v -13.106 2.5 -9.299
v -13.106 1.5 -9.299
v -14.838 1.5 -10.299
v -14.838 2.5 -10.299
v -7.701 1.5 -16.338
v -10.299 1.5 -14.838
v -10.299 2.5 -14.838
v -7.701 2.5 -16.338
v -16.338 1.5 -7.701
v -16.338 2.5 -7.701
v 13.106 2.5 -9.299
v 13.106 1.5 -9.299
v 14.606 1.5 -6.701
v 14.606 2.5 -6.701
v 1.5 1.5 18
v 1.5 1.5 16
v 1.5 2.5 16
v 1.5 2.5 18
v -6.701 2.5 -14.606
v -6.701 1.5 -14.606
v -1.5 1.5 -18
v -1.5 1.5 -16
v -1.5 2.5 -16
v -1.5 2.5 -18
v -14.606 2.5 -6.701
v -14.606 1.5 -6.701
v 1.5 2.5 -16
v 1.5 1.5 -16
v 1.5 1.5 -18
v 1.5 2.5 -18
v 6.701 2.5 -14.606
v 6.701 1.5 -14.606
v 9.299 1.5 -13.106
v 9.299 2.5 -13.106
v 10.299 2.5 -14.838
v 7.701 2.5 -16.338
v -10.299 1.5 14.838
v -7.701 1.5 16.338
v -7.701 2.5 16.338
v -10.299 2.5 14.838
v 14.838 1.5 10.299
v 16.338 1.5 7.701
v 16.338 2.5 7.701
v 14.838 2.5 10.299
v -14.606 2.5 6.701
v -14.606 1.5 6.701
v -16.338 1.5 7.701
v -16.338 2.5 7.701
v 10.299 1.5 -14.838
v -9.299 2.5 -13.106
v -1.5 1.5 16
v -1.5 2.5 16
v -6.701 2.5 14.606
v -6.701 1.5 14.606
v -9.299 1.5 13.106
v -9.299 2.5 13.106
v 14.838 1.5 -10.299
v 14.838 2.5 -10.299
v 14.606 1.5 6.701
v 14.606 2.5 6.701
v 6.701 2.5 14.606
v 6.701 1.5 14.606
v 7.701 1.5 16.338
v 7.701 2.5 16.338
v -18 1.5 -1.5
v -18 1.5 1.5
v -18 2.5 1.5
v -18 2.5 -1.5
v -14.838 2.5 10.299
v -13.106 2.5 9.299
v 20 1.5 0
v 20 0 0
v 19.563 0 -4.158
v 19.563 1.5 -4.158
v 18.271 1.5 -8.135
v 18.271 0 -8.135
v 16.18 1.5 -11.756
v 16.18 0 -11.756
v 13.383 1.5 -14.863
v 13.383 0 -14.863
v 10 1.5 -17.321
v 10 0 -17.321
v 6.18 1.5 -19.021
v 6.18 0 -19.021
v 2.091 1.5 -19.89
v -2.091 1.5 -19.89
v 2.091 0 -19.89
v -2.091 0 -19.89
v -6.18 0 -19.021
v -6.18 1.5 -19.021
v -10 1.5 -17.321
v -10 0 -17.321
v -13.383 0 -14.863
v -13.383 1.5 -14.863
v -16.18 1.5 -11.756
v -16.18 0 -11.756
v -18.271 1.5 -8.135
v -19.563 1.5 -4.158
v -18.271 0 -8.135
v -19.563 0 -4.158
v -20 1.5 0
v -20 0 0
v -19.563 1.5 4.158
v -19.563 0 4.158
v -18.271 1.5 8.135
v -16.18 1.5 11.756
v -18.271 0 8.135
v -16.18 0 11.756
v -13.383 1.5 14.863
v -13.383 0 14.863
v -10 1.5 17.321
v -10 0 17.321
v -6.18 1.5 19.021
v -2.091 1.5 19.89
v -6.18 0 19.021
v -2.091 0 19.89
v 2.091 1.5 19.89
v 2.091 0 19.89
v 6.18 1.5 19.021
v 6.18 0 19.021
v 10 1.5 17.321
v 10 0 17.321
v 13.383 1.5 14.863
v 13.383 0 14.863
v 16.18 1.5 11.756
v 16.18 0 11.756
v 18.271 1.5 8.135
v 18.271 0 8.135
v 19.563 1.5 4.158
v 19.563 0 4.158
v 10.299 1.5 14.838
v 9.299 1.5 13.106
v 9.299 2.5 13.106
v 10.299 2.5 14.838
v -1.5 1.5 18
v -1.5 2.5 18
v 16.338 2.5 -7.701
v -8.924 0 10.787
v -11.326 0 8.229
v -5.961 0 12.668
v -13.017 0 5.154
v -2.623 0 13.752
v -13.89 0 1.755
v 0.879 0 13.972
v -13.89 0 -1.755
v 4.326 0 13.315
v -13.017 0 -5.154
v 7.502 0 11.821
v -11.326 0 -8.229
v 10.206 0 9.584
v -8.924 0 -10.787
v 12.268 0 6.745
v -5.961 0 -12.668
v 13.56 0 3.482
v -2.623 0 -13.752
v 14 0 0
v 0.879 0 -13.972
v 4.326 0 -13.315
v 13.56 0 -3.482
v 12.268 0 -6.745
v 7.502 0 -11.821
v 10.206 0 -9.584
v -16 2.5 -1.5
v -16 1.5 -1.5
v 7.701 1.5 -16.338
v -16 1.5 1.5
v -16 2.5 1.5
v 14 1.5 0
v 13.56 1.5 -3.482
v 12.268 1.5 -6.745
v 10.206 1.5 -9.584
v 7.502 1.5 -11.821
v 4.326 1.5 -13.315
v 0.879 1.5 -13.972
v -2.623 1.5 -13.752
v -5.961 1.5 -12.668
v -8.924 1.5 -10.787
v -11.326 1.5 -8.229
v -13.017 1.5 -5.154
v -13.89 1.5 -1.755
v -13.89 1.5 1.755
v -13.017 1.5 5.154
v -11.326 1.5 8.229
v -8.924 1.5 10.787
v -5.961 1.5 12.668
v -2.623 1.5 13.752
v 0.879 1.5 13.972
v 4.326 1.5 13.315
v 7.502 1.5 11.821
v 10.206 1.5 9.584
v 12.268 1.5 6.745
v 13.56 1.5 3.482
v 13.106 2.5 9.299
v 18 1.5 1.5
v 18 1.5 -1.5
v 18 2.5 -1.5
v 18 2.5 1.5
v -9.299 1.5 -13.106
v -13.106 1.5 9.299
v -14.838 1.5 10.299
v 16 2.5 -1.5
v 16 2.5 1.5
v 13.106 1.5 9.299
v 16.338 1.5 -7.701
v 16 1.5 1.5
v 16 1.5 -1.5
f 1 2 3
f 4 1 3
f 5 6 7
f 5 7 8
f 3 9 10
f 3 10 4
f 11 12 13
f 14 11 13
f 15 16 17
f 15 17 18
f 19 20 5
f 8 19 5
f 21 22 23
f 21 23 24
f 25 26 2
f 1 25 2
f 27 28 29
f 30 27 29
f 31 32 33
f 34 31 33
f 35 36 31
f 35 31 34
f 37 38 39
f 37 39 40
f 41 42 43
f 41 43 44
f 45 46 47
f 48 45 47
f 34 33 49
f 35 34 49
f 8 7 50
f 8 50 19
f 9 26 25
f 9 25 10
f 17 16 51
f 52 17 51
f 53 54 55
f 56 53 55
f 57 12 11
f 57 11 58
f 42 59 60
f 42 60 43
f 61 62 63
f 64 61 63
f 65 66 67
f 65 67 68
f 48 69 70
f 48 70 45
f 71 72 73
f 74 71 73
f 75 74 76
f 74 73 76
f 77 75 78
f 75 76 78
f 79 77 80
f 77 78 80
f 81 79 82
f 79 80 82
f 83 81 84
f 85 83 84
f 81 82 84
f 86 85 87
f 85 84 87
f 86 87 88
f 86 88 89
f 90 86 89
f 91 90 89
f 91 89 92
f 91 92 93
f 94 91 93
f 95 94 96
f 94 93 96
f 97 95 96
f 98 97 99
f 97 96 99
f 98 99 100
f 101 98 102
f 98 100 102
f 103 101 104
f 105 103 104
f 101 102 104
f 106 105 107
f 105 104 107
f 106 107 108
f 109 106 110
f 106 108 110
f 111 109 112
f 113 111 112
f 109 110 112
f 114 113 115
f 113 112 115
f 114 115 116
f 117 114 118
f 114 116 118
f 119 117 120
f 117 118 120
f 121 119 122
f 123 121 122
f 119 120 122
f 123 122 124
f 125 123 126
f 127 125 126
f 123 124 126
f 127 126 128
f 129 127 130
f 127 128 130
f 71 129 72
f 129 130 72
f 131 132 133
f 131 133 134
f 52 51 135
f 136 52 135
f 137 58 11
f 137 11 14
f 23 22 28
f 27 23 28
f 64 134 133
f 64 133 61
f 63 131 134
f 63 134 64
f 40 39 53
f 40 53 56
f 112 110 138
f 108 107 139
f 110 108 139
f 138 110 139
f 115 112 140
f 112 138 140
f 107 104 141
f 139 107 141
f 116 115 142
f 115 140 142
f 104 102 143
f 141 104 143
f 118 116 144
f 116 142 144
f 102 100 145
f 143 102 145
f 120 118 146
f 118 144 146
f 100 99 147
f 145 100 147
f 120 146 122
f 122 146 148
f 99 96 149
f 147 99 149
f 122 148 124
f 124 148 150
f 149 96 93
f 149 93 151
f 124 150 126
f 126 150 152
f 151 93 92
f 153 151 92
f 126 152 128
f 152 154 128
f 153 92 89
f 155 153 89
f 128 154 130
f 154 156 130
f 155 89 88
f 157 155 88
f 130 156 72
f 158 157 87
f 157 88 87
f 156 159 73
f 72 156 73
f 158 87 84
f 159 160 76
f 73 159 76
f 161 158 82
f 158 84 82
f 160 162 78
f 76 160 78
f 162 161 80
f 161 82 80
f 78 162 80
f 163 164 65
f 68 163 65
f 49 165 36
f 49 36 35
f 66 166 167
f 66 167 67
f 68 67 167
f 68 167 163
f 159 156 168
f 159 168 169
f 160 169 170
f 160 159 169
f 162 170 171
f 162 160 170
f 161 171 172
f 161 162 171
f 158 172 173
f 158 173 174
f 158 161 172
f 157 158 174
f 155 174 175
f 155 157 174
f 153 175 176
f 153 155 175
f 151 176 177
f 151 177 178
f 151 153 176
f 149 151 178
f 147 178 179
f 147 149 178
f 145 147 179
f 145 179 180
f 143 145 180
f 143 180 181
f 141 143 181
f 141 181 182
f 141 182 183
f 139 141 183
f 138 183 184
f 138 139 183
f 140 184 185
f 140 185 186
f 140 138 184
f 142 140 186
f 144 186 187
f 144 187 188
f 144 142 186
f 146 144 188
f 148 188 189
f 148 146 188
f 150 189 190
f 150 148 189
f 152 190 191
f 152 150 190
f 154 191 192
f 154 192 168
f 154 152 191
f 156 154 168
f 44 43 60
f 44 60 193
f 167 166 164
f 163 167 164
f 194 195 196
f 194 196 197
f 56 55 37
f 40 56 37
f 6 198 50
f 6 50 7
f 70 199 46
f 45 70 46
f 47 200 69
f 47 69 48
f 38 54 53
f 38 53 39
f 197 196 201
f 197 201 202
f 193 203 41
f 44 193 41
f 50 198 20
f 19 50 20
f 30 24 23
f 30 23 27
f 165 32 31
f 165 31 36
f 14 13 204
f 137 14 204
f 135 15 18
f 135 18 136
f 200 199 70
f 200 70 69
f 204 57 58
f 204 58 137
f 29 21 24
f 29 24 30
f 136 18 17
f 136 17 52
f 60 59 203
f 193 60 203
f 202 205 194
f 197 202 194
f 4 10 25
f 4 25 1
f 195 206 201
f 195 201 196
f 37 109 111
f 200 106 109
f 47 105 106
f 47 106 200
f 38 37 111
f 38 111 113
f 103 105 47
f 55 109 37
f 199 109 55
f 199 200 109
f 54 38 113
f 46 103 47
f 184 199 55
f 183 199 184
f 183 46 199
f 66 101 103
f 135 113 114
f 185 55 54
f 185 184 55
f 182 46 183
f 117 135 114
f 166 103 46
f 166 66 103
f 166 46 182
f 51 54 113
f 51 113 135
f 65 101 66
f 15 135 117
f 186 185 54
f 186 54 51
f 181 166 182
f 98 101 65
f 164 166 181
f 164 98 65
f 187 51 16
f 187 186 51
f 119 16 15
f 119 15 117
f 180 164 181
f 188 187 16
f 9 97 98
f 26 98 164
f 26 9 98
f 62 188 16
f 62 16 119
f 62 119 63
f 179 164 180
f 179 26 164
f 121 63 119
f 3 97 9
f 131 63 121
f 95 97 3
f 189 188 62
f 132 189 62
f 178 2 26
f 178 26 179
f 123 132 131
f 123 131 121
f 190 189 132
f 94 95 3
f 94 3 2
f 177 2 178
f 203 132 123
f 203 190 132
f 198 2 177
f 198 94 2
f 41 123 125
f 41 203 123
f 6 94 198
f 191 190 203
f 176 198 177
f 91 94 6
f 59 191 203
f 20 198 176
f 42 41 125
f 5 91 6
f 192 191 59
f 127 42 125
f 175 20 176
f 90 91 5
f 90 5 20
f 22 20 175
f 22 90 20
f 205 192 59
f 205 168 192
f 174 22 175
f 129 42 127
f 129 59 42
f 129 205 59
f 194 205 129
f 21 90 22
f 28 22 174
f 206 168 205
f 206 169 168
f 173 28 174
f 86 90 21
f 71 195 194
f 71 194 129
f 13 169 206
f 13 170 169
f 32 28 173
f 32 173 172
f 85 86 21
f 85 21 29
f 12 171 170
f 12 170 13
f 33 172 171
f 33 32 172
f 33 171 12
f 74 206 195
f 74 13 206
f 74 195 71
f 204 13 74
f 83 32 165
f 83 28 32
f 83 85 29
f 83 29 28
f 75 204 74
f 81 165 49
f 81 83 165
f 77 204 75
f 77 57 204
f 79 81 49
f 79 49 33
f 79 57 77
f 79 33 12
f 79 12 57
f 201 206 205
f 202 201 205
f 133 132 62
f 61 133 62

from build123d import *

# Parameters (mm, degrees)
SKETCH1_R           = 20
SKETCH1_R_2         = 14
BOSS_EXTRUDE1_DEPTH = 1.5
SKETCH2_W           = 3
SKETCH2_H           = 2
BOSS_EXTRUDE2_DEPTH = 1
CIRPATTERN1_COUNT   = 12


with BuildPart() as part:
    # Sketch1 → Boss-Extrude1 (new body)
    with BuildSketch(Plane(origin=(0, 0, 0), x_dir=(1, 0, 0), z_dir=(0, 1, 0))):
        Circle(SKETCH1_R)
        Circle(SKETCH1_R_2, mode=Mode.SUBTRACT)
    extrude(amount=BOSS_EXTRUDE1_DEPTH)

    # Sketch2 → Boss-Extrude2 (add)
    with BuildSketch(Plane(origin=(0, 1.5, 0), x_dir=(1, 0, 0), z_dir=(0, 1, 0))):
        with Locations((0, 17)):
            Rectangle(SKETCH2_W, SKETCH2_H)
    boss_extrude2 = extrude(amount=BOSS_EXTRUDE2_DEPTH)

    # CirPattern1: Boss-Extrude2 ×12 about axis
    cirpattern1_axis = Axis((0, 0, 0), (0, 1, 0))
    for i in range(1, CIRPATTERN1_COUNT):
        add(boss_extrude2.rotate(cirpattern1_axis, i * 360 / CIRPATTERN1_COUNT))


solid = part.part
